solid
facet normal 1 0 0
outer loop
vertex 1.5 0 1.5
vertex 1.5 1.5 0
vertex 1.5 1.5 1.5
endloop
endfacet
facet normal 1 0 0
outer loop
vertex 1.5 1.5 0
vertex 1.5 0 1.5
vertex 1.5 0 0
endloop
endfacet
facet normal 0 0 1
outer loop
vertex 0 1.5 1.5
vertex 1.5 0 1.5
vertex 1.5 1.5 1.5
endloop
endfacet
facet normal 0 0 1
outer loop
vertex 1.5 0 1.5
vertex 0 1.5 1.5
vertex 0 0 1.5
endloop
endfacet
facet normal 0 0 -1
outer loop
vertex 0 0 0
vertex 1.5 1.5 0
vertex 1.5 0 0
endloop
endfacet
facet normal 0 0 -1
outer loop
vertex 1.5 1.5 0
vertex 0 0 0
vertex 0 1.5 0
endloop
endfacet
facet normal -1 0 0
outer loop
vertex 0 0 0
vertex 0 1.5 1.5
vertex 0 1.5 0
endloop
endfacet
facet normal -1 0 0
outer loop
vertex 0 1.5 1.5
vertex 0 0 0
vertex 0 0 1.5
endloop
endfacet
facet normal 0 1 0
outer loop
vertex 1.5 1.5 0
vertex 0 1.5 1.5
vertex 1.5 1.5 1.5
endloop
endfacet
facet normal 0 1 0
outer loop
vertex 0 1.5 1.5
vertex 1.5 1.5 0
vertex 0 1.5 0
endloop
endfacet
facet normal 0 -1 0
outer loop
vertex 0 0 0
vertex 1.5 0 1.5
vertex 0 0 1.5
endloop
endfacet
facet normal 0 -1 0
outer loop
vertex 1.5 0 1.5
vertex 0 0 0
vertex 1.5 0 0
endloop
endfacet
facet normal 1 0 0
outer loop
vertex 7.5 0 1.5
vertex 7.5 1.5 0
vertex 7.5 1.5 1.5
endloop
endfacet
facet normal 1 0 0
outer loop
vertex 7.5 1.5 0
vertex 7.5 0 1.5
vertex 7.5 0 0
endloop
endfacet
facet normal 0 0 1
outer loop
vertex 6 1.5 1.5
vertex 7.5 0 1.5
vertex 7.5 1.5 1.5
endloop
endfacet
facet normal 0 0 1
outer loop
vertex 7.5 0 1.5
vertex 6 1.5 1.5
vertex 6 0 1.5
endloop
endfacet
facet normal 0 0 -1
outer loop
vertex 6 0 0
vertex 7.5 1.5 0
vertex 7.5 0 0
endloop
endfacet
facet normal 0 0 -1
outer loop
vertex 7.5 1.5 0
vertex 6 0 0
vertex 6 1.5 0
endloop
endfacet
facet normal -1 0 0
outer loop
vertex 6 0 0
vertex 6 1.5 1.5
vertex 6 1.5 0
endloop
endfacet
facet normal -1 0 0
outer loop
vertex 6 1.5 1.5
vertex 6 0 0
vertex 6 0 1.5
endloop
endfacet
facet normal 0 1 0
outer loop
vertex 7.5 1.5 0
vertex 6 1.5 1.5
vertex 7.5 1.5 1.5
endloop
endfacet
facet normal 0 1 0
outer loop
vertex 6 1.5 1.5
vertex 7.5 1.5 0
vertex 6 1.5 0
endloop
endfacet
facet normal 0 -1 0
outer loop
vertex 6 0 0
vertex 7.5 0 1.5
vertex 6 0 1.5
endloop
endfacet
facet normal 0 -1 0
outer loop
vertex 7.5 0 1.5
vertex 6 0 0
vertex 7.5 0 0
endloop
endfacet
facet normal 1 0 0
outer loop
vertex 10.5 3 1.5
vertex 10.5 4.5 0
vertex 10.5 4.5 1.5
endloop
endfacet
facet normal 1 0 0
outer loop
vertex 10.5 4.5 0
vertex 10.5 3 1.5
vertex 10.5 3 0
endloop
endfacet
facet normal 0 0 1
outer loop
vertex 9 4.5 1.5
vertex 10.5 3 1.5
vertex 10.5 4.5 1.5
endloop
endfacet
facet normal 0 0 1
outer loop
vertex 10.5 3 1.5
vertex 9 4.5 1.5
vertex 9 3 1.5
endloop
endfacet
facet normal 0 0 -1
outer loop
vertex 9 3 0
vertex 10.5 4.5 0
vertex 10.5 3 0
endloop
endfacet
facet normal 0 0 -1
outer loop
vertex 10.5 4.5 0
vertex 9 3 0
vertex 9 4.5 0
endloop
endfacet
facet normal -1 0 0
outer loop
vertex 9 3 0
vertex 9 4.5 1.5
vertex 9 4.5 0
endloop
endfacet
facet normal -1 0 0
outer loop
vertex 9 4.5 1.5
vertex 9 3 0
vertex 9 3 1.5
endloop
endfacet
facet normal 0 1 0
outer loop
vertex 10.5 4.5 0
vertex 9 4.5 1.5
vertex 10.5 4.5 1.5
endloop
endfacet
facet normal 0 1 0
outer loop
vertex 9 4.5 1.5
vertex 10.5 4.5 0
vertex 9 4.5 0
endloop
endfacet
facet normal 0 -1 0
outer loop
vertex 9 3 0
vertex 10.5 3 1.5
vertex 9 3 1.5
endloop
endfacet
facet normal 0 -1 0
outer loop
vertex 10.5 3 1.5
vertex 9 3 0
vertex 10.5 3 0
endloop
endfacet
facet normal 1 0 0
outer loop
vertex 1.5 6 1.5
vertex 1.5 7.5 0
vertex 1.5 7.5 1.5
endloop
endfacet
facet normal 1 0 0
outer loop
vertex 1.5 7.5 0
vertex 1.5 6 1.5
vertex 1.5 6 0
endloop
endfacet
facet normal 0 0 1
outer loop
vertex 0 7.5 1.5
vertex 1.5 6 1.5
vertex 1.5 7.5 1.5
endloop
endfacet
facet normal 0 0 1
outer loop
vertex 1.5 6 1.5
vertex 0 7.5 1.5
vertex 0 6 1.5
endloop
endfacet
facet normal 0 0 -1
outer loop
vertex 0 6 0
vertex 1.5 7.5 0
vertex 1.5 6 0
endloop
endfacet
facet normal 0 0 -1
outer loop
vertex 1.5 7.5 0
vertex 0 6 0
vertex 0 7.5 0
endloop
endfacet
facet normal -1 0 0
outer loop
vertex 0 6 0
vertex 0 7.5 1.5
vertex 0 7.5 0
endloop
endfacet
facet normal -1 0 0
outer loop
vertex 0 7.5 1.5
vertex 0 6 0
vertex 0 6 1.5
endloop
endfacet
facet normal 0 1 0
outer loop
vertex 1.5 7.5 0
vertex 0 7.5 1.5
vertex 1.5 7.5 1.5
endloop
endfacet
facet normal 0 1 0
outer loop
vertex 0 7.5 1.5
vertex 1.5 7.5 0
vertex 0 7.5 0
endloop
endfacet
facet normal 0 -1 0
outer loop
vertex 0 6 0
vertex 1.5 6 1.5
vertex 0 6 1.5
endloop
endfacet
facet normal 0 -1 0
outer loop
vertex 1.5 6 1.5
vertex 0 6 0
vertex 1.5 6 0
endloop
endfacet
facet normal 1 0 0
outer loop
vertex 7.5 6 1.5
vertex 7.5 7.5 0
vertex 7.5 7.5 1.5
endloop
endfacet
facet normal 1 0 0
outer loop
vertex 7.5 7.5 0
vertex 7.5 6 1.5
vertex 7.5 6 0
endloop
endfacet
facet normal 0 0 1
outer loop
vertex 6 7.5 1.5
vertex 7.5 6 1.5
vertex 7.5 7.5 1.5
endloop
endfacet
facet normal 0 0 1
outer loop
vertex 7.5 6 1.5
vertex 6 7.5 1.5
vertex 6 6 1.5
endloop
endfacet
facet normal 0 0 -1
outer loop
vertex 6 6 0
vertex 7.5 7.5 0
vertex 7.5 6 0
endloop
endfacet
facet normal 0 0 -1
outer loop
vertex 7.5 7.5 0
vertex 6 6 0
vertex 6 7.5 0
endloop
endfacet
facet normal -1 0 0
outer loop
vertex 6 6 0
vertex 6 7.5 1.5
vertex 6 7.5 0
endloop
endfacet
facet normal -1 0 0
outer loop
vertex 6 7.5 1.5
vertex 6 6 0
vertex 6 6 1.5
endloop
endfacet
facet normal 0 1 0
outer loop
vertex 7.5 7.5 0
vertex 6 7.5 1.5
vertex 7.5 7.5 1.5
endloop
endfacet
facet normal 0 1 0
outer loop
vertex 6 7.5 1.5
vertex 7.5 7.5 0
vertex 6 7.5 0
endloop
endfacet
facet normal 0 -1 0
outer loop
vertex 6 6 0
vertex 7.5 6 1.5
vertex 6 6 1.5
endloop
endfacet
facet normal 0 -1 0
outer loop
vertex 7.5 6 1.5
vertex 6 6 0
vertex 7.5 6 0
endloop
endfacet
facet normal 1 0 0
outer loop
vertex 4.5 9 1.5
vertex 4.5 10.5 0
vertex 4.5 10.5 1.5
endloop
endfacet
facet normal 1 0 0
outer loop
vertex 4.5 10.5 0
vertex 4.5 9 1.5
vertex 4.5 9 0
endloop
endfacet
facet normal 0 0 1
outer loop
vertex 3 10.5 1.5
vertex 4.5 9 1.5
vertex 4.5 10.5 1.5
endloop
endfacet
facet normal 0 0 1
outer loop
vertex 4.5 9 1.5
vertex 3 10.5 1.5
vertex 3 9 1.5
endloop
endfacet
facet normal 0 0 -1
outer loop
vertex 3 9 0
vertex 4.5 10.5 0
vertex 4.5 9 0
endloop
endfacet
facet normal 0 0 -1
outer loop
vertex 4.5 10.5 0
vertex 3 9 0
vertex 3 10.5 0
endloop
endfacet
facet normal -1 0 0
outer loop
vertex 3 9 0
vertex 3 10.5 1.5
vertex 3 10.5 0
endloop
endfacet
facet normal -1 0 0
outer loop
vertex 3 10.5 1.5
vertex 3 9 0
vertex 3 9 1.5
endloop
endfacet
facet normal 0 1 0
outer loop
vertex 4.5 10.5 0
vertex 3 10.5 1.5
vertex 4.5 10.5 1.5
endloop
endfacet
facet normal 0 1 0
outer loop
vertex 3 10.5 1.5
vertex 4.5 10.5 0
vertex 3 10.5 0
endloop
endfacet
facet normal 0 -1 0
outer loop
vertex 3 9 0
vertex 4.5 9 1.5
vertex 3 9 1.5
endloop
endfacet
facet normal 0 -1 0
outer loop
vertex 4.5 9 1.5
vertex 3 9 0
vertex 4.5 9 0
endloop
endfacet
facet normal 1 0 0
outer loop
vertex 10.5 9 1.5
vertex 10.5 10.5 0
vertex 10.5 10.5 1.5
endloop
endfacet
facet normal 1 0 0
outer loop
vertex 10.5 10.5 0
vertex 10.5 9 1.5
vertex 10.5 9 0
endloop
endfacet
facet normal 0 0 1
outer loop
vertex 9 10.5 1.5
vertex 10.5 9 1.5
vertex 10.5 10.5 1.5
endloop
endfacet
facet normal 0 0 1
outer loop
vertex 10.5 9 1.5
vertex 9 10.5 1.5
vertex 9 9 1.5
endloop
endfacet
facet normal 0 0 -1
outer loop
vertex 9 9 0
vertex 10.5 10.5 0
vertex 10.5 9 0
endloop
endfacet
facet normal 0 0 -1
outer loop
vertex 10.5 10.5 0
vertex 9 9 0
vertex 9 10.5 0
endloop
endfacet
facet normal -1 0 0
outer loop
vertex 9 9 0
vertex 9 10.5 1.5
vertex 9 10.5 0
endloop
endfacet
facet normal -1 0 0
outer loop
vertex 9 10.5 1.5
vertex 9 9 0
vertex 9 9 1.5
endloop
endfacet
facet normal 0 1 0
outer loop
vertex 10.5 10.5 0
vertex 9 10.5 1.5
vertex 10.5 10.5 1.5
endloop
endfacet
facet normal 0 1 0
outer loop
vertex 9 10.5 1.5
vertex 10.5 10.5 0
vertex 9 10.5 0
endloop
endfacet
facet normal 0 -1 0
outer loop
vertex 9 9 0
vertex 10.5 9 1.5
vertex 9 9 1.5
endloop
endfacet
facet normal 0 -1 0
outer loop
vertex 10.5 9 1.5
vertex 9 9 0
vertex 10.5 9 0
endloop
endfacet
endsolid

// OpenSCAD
union() {
	translate([0, 0, 0]) cube(size=[1.5,1.5,1.5], center=false);
	translate([6, 0, 0]) cube(size=[1.5,1.5,1.5], center=false);
	translate([9, 3, 0]) cube(size=[1.5,1.5,1.5], center=false);
	translate([0, 6, 0]) cube(size=[1.5,1.5,1.5], center=false);
	translate([6, 6, 0]) cube(size=[1.5,1.5,1.5], center=false);
	translate([3, 9, 0]) cube(size=[1.5,1.5,1.5], center=false);
	translate([9, 9, 0]) cube(size=[1.5,1.5,1.5], center=false);
}
